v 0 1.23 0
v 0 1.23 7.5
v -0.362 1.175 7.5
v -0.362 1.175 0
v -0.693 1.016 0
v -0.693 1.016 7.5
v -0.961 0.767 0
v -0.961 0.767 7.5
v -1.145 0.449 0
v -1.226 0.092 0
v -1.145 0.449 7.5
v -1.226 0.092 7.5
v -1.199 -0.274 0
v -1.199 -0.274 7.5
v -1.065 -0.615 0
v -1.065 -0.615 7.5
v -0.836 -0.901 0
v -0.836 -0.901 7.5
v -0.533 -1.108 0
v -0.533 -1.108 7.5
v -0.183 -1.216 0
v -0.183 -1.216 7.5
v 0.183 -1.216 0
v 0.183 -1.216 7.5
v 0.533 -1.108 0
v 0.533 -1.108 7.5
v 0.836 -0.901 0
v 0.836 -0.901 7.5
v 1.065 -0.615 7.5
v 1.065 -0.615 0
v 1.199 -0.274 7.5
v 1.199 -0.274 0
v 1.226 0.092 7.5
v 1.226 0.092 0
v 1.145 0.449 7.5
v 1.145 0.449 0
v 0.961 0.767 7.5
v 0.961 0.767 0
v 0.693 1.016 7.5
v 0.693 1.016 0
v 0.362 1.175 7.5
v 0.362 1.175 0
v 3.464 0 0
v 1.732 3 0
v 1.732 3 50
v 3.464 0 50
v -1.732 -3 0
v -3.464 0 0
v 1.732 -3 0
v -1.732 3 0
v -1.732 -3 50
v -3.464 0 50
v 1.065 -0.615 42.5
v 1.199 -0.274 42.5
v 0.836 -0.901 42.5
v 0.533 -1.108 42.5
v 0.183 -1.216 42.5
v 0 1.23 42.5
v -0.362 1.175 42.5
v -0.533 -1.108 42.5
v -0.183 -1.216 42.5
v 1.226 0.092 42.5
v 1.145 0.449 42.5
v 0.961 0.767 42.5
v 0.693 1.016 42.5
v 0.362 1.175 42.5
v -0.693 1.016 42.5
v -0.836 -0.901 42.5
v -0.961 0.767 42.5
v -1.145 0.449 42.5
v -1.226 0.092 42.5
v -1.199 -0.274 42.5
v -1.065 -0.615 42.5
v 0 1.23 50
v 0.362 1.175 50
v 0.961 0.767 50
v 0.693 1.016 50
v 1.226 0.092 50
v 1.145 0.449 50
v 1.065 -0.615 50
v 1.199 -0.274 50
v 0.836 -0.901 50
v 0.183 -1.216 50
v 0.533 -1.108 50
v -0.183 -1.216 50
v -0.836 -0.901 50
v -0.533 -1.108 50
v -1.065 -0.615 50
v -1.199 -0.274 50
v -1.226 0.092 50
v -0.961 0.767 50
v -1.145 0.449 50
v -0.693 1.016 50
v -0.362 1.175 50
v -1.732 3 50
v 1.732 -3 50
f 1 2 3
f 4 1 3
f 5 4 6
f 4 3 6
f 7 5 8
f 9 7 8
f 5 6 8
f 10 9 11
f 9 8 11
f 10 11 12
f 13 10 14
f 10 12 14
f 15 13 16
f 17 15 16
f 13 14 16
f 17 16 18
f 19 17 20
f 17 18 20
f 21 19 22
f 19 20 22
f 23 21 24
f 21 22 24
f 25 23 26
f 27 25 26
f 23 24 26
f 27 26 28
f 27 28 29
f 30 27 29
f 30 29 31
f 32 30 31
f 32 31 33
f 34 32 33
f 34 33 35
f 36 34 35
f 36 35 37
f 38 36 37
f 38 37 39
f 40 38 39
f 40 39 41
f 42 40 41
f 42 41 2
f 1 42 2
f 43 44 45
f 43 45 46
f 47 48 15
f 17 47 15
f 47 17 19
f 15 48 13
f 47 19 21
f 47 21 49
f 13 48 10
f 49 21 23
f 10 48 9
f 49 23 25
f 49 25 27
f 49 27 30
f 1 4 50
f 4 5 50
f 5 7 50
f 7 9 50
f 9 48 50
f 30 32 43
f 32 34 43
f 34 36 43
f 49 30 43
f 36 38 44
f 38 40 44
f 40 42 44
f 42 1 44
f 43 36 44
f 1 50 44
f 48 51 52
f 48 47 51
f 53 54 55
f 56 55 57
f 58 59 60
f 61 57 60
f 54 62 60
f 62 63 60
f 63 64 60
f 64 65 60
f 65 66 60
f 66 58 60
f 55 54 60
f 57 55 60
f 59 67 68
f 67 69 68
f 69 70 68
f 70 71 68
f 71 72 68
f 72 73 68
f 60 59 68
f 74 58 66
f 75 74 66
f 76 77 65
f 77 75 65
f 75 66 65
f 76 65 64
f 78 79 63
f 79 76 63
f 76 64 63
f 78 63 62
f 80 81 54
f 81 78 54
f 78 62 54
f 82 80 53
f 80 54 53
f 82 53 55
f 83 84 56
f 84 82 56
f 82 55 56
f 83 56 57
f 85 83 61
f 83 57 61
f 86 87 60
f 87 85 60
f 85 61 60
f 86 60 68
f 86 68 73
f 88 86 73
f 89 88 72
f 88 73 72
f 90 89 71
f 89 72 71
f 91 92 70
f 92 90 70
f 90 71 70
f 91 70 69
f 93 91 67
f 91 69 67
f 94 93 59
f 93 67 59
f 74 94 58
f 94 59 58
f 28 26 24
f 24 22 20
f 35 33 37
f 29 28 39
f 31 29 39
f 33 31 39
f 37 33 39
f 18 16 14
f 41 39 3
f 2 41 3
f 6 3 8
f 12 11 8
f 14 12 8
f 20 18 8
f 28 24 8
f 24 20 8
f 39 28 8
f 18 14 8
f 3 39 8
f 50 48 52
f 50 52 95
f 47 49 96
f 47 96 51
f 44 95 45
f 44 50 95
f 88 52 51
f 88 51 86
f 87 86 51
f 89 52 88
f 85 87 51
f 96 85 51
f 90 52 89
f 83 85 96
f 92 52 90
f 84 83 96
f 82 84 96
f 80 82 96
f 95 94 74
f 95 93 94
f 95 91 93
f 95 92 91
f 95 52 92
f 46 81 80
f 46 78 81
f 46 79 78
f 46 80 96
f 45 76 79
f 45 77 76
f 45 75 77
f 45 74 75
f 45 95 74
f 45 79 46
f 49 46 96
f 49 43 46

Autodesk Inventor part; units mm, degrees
ref_plane "YZ Plane" through (0, 0, 0) normal (1, 0, 0) x (0, 1, 0)
ref_plane "XZ Plane" through (0, 0, 0) normal (0, 1, 0) x (-1, 0, 0)
sketch "Sketch1" plane through (0, 0, 0) normal (0, 0, 1) x (1, 0, 0)
  line L0 (1.7321, 3) -> (3.4641, 0)
  line L1 (3.4641, 0) -> (1.7321, -3)
  line L2 (1.7321, -3) -> (-1.7321, -3)
  line L3 (-1.7321, -3) -> (-3.4641, 0)
  line L4 (-3.4641, 0) -> (-1.7321, 3)
  line L5 (-1.7321, 3) -> (1.7321, 3)
  point P0 (0, 0)
  point P1 (0, 0)
  dimension "d0" = 6
extrude "Extrusion1" add sketch "Sketch1" along normal blind 50
sketch "Sketch2" plane through (0, 0, 0) normal (0, 0, -1) x (-1, 0, 0)
  line L0 (-1.7321, 3) -> (1.7321, 3) projected
  line L1 (-3.4641, 0) -> (-1.7321, 3) projected
  line L2 (-1.7321, -3) -> (-3.4641, 0) projected
  line L3 (1.7321, -3) -> (-1.7321, -3) projected
  line L4 (3.4641, 0) -> (1.7321, -3) projected
  line L5 (1.7321, 3) -> (3.4641, 0) projected
  point P0 (0, 0)
  point P1 (0, 0)
hole "Hole1" at (0, 0, 0) direction (0, 0, 1) diameter 2.459 depth 7.5 thread size "M3x0.5" class "6H" standard "ISO Metric profile"
ref_plane "Work Plane1" through (0, 0, 25) normal (0, 0, -1) x (-1, 0, 0)
mirror "Mirror1" about plane through (0, 0, 25) normal (0, 0, -1) of "Hole1"
properties part number "Wurth 970500361"
